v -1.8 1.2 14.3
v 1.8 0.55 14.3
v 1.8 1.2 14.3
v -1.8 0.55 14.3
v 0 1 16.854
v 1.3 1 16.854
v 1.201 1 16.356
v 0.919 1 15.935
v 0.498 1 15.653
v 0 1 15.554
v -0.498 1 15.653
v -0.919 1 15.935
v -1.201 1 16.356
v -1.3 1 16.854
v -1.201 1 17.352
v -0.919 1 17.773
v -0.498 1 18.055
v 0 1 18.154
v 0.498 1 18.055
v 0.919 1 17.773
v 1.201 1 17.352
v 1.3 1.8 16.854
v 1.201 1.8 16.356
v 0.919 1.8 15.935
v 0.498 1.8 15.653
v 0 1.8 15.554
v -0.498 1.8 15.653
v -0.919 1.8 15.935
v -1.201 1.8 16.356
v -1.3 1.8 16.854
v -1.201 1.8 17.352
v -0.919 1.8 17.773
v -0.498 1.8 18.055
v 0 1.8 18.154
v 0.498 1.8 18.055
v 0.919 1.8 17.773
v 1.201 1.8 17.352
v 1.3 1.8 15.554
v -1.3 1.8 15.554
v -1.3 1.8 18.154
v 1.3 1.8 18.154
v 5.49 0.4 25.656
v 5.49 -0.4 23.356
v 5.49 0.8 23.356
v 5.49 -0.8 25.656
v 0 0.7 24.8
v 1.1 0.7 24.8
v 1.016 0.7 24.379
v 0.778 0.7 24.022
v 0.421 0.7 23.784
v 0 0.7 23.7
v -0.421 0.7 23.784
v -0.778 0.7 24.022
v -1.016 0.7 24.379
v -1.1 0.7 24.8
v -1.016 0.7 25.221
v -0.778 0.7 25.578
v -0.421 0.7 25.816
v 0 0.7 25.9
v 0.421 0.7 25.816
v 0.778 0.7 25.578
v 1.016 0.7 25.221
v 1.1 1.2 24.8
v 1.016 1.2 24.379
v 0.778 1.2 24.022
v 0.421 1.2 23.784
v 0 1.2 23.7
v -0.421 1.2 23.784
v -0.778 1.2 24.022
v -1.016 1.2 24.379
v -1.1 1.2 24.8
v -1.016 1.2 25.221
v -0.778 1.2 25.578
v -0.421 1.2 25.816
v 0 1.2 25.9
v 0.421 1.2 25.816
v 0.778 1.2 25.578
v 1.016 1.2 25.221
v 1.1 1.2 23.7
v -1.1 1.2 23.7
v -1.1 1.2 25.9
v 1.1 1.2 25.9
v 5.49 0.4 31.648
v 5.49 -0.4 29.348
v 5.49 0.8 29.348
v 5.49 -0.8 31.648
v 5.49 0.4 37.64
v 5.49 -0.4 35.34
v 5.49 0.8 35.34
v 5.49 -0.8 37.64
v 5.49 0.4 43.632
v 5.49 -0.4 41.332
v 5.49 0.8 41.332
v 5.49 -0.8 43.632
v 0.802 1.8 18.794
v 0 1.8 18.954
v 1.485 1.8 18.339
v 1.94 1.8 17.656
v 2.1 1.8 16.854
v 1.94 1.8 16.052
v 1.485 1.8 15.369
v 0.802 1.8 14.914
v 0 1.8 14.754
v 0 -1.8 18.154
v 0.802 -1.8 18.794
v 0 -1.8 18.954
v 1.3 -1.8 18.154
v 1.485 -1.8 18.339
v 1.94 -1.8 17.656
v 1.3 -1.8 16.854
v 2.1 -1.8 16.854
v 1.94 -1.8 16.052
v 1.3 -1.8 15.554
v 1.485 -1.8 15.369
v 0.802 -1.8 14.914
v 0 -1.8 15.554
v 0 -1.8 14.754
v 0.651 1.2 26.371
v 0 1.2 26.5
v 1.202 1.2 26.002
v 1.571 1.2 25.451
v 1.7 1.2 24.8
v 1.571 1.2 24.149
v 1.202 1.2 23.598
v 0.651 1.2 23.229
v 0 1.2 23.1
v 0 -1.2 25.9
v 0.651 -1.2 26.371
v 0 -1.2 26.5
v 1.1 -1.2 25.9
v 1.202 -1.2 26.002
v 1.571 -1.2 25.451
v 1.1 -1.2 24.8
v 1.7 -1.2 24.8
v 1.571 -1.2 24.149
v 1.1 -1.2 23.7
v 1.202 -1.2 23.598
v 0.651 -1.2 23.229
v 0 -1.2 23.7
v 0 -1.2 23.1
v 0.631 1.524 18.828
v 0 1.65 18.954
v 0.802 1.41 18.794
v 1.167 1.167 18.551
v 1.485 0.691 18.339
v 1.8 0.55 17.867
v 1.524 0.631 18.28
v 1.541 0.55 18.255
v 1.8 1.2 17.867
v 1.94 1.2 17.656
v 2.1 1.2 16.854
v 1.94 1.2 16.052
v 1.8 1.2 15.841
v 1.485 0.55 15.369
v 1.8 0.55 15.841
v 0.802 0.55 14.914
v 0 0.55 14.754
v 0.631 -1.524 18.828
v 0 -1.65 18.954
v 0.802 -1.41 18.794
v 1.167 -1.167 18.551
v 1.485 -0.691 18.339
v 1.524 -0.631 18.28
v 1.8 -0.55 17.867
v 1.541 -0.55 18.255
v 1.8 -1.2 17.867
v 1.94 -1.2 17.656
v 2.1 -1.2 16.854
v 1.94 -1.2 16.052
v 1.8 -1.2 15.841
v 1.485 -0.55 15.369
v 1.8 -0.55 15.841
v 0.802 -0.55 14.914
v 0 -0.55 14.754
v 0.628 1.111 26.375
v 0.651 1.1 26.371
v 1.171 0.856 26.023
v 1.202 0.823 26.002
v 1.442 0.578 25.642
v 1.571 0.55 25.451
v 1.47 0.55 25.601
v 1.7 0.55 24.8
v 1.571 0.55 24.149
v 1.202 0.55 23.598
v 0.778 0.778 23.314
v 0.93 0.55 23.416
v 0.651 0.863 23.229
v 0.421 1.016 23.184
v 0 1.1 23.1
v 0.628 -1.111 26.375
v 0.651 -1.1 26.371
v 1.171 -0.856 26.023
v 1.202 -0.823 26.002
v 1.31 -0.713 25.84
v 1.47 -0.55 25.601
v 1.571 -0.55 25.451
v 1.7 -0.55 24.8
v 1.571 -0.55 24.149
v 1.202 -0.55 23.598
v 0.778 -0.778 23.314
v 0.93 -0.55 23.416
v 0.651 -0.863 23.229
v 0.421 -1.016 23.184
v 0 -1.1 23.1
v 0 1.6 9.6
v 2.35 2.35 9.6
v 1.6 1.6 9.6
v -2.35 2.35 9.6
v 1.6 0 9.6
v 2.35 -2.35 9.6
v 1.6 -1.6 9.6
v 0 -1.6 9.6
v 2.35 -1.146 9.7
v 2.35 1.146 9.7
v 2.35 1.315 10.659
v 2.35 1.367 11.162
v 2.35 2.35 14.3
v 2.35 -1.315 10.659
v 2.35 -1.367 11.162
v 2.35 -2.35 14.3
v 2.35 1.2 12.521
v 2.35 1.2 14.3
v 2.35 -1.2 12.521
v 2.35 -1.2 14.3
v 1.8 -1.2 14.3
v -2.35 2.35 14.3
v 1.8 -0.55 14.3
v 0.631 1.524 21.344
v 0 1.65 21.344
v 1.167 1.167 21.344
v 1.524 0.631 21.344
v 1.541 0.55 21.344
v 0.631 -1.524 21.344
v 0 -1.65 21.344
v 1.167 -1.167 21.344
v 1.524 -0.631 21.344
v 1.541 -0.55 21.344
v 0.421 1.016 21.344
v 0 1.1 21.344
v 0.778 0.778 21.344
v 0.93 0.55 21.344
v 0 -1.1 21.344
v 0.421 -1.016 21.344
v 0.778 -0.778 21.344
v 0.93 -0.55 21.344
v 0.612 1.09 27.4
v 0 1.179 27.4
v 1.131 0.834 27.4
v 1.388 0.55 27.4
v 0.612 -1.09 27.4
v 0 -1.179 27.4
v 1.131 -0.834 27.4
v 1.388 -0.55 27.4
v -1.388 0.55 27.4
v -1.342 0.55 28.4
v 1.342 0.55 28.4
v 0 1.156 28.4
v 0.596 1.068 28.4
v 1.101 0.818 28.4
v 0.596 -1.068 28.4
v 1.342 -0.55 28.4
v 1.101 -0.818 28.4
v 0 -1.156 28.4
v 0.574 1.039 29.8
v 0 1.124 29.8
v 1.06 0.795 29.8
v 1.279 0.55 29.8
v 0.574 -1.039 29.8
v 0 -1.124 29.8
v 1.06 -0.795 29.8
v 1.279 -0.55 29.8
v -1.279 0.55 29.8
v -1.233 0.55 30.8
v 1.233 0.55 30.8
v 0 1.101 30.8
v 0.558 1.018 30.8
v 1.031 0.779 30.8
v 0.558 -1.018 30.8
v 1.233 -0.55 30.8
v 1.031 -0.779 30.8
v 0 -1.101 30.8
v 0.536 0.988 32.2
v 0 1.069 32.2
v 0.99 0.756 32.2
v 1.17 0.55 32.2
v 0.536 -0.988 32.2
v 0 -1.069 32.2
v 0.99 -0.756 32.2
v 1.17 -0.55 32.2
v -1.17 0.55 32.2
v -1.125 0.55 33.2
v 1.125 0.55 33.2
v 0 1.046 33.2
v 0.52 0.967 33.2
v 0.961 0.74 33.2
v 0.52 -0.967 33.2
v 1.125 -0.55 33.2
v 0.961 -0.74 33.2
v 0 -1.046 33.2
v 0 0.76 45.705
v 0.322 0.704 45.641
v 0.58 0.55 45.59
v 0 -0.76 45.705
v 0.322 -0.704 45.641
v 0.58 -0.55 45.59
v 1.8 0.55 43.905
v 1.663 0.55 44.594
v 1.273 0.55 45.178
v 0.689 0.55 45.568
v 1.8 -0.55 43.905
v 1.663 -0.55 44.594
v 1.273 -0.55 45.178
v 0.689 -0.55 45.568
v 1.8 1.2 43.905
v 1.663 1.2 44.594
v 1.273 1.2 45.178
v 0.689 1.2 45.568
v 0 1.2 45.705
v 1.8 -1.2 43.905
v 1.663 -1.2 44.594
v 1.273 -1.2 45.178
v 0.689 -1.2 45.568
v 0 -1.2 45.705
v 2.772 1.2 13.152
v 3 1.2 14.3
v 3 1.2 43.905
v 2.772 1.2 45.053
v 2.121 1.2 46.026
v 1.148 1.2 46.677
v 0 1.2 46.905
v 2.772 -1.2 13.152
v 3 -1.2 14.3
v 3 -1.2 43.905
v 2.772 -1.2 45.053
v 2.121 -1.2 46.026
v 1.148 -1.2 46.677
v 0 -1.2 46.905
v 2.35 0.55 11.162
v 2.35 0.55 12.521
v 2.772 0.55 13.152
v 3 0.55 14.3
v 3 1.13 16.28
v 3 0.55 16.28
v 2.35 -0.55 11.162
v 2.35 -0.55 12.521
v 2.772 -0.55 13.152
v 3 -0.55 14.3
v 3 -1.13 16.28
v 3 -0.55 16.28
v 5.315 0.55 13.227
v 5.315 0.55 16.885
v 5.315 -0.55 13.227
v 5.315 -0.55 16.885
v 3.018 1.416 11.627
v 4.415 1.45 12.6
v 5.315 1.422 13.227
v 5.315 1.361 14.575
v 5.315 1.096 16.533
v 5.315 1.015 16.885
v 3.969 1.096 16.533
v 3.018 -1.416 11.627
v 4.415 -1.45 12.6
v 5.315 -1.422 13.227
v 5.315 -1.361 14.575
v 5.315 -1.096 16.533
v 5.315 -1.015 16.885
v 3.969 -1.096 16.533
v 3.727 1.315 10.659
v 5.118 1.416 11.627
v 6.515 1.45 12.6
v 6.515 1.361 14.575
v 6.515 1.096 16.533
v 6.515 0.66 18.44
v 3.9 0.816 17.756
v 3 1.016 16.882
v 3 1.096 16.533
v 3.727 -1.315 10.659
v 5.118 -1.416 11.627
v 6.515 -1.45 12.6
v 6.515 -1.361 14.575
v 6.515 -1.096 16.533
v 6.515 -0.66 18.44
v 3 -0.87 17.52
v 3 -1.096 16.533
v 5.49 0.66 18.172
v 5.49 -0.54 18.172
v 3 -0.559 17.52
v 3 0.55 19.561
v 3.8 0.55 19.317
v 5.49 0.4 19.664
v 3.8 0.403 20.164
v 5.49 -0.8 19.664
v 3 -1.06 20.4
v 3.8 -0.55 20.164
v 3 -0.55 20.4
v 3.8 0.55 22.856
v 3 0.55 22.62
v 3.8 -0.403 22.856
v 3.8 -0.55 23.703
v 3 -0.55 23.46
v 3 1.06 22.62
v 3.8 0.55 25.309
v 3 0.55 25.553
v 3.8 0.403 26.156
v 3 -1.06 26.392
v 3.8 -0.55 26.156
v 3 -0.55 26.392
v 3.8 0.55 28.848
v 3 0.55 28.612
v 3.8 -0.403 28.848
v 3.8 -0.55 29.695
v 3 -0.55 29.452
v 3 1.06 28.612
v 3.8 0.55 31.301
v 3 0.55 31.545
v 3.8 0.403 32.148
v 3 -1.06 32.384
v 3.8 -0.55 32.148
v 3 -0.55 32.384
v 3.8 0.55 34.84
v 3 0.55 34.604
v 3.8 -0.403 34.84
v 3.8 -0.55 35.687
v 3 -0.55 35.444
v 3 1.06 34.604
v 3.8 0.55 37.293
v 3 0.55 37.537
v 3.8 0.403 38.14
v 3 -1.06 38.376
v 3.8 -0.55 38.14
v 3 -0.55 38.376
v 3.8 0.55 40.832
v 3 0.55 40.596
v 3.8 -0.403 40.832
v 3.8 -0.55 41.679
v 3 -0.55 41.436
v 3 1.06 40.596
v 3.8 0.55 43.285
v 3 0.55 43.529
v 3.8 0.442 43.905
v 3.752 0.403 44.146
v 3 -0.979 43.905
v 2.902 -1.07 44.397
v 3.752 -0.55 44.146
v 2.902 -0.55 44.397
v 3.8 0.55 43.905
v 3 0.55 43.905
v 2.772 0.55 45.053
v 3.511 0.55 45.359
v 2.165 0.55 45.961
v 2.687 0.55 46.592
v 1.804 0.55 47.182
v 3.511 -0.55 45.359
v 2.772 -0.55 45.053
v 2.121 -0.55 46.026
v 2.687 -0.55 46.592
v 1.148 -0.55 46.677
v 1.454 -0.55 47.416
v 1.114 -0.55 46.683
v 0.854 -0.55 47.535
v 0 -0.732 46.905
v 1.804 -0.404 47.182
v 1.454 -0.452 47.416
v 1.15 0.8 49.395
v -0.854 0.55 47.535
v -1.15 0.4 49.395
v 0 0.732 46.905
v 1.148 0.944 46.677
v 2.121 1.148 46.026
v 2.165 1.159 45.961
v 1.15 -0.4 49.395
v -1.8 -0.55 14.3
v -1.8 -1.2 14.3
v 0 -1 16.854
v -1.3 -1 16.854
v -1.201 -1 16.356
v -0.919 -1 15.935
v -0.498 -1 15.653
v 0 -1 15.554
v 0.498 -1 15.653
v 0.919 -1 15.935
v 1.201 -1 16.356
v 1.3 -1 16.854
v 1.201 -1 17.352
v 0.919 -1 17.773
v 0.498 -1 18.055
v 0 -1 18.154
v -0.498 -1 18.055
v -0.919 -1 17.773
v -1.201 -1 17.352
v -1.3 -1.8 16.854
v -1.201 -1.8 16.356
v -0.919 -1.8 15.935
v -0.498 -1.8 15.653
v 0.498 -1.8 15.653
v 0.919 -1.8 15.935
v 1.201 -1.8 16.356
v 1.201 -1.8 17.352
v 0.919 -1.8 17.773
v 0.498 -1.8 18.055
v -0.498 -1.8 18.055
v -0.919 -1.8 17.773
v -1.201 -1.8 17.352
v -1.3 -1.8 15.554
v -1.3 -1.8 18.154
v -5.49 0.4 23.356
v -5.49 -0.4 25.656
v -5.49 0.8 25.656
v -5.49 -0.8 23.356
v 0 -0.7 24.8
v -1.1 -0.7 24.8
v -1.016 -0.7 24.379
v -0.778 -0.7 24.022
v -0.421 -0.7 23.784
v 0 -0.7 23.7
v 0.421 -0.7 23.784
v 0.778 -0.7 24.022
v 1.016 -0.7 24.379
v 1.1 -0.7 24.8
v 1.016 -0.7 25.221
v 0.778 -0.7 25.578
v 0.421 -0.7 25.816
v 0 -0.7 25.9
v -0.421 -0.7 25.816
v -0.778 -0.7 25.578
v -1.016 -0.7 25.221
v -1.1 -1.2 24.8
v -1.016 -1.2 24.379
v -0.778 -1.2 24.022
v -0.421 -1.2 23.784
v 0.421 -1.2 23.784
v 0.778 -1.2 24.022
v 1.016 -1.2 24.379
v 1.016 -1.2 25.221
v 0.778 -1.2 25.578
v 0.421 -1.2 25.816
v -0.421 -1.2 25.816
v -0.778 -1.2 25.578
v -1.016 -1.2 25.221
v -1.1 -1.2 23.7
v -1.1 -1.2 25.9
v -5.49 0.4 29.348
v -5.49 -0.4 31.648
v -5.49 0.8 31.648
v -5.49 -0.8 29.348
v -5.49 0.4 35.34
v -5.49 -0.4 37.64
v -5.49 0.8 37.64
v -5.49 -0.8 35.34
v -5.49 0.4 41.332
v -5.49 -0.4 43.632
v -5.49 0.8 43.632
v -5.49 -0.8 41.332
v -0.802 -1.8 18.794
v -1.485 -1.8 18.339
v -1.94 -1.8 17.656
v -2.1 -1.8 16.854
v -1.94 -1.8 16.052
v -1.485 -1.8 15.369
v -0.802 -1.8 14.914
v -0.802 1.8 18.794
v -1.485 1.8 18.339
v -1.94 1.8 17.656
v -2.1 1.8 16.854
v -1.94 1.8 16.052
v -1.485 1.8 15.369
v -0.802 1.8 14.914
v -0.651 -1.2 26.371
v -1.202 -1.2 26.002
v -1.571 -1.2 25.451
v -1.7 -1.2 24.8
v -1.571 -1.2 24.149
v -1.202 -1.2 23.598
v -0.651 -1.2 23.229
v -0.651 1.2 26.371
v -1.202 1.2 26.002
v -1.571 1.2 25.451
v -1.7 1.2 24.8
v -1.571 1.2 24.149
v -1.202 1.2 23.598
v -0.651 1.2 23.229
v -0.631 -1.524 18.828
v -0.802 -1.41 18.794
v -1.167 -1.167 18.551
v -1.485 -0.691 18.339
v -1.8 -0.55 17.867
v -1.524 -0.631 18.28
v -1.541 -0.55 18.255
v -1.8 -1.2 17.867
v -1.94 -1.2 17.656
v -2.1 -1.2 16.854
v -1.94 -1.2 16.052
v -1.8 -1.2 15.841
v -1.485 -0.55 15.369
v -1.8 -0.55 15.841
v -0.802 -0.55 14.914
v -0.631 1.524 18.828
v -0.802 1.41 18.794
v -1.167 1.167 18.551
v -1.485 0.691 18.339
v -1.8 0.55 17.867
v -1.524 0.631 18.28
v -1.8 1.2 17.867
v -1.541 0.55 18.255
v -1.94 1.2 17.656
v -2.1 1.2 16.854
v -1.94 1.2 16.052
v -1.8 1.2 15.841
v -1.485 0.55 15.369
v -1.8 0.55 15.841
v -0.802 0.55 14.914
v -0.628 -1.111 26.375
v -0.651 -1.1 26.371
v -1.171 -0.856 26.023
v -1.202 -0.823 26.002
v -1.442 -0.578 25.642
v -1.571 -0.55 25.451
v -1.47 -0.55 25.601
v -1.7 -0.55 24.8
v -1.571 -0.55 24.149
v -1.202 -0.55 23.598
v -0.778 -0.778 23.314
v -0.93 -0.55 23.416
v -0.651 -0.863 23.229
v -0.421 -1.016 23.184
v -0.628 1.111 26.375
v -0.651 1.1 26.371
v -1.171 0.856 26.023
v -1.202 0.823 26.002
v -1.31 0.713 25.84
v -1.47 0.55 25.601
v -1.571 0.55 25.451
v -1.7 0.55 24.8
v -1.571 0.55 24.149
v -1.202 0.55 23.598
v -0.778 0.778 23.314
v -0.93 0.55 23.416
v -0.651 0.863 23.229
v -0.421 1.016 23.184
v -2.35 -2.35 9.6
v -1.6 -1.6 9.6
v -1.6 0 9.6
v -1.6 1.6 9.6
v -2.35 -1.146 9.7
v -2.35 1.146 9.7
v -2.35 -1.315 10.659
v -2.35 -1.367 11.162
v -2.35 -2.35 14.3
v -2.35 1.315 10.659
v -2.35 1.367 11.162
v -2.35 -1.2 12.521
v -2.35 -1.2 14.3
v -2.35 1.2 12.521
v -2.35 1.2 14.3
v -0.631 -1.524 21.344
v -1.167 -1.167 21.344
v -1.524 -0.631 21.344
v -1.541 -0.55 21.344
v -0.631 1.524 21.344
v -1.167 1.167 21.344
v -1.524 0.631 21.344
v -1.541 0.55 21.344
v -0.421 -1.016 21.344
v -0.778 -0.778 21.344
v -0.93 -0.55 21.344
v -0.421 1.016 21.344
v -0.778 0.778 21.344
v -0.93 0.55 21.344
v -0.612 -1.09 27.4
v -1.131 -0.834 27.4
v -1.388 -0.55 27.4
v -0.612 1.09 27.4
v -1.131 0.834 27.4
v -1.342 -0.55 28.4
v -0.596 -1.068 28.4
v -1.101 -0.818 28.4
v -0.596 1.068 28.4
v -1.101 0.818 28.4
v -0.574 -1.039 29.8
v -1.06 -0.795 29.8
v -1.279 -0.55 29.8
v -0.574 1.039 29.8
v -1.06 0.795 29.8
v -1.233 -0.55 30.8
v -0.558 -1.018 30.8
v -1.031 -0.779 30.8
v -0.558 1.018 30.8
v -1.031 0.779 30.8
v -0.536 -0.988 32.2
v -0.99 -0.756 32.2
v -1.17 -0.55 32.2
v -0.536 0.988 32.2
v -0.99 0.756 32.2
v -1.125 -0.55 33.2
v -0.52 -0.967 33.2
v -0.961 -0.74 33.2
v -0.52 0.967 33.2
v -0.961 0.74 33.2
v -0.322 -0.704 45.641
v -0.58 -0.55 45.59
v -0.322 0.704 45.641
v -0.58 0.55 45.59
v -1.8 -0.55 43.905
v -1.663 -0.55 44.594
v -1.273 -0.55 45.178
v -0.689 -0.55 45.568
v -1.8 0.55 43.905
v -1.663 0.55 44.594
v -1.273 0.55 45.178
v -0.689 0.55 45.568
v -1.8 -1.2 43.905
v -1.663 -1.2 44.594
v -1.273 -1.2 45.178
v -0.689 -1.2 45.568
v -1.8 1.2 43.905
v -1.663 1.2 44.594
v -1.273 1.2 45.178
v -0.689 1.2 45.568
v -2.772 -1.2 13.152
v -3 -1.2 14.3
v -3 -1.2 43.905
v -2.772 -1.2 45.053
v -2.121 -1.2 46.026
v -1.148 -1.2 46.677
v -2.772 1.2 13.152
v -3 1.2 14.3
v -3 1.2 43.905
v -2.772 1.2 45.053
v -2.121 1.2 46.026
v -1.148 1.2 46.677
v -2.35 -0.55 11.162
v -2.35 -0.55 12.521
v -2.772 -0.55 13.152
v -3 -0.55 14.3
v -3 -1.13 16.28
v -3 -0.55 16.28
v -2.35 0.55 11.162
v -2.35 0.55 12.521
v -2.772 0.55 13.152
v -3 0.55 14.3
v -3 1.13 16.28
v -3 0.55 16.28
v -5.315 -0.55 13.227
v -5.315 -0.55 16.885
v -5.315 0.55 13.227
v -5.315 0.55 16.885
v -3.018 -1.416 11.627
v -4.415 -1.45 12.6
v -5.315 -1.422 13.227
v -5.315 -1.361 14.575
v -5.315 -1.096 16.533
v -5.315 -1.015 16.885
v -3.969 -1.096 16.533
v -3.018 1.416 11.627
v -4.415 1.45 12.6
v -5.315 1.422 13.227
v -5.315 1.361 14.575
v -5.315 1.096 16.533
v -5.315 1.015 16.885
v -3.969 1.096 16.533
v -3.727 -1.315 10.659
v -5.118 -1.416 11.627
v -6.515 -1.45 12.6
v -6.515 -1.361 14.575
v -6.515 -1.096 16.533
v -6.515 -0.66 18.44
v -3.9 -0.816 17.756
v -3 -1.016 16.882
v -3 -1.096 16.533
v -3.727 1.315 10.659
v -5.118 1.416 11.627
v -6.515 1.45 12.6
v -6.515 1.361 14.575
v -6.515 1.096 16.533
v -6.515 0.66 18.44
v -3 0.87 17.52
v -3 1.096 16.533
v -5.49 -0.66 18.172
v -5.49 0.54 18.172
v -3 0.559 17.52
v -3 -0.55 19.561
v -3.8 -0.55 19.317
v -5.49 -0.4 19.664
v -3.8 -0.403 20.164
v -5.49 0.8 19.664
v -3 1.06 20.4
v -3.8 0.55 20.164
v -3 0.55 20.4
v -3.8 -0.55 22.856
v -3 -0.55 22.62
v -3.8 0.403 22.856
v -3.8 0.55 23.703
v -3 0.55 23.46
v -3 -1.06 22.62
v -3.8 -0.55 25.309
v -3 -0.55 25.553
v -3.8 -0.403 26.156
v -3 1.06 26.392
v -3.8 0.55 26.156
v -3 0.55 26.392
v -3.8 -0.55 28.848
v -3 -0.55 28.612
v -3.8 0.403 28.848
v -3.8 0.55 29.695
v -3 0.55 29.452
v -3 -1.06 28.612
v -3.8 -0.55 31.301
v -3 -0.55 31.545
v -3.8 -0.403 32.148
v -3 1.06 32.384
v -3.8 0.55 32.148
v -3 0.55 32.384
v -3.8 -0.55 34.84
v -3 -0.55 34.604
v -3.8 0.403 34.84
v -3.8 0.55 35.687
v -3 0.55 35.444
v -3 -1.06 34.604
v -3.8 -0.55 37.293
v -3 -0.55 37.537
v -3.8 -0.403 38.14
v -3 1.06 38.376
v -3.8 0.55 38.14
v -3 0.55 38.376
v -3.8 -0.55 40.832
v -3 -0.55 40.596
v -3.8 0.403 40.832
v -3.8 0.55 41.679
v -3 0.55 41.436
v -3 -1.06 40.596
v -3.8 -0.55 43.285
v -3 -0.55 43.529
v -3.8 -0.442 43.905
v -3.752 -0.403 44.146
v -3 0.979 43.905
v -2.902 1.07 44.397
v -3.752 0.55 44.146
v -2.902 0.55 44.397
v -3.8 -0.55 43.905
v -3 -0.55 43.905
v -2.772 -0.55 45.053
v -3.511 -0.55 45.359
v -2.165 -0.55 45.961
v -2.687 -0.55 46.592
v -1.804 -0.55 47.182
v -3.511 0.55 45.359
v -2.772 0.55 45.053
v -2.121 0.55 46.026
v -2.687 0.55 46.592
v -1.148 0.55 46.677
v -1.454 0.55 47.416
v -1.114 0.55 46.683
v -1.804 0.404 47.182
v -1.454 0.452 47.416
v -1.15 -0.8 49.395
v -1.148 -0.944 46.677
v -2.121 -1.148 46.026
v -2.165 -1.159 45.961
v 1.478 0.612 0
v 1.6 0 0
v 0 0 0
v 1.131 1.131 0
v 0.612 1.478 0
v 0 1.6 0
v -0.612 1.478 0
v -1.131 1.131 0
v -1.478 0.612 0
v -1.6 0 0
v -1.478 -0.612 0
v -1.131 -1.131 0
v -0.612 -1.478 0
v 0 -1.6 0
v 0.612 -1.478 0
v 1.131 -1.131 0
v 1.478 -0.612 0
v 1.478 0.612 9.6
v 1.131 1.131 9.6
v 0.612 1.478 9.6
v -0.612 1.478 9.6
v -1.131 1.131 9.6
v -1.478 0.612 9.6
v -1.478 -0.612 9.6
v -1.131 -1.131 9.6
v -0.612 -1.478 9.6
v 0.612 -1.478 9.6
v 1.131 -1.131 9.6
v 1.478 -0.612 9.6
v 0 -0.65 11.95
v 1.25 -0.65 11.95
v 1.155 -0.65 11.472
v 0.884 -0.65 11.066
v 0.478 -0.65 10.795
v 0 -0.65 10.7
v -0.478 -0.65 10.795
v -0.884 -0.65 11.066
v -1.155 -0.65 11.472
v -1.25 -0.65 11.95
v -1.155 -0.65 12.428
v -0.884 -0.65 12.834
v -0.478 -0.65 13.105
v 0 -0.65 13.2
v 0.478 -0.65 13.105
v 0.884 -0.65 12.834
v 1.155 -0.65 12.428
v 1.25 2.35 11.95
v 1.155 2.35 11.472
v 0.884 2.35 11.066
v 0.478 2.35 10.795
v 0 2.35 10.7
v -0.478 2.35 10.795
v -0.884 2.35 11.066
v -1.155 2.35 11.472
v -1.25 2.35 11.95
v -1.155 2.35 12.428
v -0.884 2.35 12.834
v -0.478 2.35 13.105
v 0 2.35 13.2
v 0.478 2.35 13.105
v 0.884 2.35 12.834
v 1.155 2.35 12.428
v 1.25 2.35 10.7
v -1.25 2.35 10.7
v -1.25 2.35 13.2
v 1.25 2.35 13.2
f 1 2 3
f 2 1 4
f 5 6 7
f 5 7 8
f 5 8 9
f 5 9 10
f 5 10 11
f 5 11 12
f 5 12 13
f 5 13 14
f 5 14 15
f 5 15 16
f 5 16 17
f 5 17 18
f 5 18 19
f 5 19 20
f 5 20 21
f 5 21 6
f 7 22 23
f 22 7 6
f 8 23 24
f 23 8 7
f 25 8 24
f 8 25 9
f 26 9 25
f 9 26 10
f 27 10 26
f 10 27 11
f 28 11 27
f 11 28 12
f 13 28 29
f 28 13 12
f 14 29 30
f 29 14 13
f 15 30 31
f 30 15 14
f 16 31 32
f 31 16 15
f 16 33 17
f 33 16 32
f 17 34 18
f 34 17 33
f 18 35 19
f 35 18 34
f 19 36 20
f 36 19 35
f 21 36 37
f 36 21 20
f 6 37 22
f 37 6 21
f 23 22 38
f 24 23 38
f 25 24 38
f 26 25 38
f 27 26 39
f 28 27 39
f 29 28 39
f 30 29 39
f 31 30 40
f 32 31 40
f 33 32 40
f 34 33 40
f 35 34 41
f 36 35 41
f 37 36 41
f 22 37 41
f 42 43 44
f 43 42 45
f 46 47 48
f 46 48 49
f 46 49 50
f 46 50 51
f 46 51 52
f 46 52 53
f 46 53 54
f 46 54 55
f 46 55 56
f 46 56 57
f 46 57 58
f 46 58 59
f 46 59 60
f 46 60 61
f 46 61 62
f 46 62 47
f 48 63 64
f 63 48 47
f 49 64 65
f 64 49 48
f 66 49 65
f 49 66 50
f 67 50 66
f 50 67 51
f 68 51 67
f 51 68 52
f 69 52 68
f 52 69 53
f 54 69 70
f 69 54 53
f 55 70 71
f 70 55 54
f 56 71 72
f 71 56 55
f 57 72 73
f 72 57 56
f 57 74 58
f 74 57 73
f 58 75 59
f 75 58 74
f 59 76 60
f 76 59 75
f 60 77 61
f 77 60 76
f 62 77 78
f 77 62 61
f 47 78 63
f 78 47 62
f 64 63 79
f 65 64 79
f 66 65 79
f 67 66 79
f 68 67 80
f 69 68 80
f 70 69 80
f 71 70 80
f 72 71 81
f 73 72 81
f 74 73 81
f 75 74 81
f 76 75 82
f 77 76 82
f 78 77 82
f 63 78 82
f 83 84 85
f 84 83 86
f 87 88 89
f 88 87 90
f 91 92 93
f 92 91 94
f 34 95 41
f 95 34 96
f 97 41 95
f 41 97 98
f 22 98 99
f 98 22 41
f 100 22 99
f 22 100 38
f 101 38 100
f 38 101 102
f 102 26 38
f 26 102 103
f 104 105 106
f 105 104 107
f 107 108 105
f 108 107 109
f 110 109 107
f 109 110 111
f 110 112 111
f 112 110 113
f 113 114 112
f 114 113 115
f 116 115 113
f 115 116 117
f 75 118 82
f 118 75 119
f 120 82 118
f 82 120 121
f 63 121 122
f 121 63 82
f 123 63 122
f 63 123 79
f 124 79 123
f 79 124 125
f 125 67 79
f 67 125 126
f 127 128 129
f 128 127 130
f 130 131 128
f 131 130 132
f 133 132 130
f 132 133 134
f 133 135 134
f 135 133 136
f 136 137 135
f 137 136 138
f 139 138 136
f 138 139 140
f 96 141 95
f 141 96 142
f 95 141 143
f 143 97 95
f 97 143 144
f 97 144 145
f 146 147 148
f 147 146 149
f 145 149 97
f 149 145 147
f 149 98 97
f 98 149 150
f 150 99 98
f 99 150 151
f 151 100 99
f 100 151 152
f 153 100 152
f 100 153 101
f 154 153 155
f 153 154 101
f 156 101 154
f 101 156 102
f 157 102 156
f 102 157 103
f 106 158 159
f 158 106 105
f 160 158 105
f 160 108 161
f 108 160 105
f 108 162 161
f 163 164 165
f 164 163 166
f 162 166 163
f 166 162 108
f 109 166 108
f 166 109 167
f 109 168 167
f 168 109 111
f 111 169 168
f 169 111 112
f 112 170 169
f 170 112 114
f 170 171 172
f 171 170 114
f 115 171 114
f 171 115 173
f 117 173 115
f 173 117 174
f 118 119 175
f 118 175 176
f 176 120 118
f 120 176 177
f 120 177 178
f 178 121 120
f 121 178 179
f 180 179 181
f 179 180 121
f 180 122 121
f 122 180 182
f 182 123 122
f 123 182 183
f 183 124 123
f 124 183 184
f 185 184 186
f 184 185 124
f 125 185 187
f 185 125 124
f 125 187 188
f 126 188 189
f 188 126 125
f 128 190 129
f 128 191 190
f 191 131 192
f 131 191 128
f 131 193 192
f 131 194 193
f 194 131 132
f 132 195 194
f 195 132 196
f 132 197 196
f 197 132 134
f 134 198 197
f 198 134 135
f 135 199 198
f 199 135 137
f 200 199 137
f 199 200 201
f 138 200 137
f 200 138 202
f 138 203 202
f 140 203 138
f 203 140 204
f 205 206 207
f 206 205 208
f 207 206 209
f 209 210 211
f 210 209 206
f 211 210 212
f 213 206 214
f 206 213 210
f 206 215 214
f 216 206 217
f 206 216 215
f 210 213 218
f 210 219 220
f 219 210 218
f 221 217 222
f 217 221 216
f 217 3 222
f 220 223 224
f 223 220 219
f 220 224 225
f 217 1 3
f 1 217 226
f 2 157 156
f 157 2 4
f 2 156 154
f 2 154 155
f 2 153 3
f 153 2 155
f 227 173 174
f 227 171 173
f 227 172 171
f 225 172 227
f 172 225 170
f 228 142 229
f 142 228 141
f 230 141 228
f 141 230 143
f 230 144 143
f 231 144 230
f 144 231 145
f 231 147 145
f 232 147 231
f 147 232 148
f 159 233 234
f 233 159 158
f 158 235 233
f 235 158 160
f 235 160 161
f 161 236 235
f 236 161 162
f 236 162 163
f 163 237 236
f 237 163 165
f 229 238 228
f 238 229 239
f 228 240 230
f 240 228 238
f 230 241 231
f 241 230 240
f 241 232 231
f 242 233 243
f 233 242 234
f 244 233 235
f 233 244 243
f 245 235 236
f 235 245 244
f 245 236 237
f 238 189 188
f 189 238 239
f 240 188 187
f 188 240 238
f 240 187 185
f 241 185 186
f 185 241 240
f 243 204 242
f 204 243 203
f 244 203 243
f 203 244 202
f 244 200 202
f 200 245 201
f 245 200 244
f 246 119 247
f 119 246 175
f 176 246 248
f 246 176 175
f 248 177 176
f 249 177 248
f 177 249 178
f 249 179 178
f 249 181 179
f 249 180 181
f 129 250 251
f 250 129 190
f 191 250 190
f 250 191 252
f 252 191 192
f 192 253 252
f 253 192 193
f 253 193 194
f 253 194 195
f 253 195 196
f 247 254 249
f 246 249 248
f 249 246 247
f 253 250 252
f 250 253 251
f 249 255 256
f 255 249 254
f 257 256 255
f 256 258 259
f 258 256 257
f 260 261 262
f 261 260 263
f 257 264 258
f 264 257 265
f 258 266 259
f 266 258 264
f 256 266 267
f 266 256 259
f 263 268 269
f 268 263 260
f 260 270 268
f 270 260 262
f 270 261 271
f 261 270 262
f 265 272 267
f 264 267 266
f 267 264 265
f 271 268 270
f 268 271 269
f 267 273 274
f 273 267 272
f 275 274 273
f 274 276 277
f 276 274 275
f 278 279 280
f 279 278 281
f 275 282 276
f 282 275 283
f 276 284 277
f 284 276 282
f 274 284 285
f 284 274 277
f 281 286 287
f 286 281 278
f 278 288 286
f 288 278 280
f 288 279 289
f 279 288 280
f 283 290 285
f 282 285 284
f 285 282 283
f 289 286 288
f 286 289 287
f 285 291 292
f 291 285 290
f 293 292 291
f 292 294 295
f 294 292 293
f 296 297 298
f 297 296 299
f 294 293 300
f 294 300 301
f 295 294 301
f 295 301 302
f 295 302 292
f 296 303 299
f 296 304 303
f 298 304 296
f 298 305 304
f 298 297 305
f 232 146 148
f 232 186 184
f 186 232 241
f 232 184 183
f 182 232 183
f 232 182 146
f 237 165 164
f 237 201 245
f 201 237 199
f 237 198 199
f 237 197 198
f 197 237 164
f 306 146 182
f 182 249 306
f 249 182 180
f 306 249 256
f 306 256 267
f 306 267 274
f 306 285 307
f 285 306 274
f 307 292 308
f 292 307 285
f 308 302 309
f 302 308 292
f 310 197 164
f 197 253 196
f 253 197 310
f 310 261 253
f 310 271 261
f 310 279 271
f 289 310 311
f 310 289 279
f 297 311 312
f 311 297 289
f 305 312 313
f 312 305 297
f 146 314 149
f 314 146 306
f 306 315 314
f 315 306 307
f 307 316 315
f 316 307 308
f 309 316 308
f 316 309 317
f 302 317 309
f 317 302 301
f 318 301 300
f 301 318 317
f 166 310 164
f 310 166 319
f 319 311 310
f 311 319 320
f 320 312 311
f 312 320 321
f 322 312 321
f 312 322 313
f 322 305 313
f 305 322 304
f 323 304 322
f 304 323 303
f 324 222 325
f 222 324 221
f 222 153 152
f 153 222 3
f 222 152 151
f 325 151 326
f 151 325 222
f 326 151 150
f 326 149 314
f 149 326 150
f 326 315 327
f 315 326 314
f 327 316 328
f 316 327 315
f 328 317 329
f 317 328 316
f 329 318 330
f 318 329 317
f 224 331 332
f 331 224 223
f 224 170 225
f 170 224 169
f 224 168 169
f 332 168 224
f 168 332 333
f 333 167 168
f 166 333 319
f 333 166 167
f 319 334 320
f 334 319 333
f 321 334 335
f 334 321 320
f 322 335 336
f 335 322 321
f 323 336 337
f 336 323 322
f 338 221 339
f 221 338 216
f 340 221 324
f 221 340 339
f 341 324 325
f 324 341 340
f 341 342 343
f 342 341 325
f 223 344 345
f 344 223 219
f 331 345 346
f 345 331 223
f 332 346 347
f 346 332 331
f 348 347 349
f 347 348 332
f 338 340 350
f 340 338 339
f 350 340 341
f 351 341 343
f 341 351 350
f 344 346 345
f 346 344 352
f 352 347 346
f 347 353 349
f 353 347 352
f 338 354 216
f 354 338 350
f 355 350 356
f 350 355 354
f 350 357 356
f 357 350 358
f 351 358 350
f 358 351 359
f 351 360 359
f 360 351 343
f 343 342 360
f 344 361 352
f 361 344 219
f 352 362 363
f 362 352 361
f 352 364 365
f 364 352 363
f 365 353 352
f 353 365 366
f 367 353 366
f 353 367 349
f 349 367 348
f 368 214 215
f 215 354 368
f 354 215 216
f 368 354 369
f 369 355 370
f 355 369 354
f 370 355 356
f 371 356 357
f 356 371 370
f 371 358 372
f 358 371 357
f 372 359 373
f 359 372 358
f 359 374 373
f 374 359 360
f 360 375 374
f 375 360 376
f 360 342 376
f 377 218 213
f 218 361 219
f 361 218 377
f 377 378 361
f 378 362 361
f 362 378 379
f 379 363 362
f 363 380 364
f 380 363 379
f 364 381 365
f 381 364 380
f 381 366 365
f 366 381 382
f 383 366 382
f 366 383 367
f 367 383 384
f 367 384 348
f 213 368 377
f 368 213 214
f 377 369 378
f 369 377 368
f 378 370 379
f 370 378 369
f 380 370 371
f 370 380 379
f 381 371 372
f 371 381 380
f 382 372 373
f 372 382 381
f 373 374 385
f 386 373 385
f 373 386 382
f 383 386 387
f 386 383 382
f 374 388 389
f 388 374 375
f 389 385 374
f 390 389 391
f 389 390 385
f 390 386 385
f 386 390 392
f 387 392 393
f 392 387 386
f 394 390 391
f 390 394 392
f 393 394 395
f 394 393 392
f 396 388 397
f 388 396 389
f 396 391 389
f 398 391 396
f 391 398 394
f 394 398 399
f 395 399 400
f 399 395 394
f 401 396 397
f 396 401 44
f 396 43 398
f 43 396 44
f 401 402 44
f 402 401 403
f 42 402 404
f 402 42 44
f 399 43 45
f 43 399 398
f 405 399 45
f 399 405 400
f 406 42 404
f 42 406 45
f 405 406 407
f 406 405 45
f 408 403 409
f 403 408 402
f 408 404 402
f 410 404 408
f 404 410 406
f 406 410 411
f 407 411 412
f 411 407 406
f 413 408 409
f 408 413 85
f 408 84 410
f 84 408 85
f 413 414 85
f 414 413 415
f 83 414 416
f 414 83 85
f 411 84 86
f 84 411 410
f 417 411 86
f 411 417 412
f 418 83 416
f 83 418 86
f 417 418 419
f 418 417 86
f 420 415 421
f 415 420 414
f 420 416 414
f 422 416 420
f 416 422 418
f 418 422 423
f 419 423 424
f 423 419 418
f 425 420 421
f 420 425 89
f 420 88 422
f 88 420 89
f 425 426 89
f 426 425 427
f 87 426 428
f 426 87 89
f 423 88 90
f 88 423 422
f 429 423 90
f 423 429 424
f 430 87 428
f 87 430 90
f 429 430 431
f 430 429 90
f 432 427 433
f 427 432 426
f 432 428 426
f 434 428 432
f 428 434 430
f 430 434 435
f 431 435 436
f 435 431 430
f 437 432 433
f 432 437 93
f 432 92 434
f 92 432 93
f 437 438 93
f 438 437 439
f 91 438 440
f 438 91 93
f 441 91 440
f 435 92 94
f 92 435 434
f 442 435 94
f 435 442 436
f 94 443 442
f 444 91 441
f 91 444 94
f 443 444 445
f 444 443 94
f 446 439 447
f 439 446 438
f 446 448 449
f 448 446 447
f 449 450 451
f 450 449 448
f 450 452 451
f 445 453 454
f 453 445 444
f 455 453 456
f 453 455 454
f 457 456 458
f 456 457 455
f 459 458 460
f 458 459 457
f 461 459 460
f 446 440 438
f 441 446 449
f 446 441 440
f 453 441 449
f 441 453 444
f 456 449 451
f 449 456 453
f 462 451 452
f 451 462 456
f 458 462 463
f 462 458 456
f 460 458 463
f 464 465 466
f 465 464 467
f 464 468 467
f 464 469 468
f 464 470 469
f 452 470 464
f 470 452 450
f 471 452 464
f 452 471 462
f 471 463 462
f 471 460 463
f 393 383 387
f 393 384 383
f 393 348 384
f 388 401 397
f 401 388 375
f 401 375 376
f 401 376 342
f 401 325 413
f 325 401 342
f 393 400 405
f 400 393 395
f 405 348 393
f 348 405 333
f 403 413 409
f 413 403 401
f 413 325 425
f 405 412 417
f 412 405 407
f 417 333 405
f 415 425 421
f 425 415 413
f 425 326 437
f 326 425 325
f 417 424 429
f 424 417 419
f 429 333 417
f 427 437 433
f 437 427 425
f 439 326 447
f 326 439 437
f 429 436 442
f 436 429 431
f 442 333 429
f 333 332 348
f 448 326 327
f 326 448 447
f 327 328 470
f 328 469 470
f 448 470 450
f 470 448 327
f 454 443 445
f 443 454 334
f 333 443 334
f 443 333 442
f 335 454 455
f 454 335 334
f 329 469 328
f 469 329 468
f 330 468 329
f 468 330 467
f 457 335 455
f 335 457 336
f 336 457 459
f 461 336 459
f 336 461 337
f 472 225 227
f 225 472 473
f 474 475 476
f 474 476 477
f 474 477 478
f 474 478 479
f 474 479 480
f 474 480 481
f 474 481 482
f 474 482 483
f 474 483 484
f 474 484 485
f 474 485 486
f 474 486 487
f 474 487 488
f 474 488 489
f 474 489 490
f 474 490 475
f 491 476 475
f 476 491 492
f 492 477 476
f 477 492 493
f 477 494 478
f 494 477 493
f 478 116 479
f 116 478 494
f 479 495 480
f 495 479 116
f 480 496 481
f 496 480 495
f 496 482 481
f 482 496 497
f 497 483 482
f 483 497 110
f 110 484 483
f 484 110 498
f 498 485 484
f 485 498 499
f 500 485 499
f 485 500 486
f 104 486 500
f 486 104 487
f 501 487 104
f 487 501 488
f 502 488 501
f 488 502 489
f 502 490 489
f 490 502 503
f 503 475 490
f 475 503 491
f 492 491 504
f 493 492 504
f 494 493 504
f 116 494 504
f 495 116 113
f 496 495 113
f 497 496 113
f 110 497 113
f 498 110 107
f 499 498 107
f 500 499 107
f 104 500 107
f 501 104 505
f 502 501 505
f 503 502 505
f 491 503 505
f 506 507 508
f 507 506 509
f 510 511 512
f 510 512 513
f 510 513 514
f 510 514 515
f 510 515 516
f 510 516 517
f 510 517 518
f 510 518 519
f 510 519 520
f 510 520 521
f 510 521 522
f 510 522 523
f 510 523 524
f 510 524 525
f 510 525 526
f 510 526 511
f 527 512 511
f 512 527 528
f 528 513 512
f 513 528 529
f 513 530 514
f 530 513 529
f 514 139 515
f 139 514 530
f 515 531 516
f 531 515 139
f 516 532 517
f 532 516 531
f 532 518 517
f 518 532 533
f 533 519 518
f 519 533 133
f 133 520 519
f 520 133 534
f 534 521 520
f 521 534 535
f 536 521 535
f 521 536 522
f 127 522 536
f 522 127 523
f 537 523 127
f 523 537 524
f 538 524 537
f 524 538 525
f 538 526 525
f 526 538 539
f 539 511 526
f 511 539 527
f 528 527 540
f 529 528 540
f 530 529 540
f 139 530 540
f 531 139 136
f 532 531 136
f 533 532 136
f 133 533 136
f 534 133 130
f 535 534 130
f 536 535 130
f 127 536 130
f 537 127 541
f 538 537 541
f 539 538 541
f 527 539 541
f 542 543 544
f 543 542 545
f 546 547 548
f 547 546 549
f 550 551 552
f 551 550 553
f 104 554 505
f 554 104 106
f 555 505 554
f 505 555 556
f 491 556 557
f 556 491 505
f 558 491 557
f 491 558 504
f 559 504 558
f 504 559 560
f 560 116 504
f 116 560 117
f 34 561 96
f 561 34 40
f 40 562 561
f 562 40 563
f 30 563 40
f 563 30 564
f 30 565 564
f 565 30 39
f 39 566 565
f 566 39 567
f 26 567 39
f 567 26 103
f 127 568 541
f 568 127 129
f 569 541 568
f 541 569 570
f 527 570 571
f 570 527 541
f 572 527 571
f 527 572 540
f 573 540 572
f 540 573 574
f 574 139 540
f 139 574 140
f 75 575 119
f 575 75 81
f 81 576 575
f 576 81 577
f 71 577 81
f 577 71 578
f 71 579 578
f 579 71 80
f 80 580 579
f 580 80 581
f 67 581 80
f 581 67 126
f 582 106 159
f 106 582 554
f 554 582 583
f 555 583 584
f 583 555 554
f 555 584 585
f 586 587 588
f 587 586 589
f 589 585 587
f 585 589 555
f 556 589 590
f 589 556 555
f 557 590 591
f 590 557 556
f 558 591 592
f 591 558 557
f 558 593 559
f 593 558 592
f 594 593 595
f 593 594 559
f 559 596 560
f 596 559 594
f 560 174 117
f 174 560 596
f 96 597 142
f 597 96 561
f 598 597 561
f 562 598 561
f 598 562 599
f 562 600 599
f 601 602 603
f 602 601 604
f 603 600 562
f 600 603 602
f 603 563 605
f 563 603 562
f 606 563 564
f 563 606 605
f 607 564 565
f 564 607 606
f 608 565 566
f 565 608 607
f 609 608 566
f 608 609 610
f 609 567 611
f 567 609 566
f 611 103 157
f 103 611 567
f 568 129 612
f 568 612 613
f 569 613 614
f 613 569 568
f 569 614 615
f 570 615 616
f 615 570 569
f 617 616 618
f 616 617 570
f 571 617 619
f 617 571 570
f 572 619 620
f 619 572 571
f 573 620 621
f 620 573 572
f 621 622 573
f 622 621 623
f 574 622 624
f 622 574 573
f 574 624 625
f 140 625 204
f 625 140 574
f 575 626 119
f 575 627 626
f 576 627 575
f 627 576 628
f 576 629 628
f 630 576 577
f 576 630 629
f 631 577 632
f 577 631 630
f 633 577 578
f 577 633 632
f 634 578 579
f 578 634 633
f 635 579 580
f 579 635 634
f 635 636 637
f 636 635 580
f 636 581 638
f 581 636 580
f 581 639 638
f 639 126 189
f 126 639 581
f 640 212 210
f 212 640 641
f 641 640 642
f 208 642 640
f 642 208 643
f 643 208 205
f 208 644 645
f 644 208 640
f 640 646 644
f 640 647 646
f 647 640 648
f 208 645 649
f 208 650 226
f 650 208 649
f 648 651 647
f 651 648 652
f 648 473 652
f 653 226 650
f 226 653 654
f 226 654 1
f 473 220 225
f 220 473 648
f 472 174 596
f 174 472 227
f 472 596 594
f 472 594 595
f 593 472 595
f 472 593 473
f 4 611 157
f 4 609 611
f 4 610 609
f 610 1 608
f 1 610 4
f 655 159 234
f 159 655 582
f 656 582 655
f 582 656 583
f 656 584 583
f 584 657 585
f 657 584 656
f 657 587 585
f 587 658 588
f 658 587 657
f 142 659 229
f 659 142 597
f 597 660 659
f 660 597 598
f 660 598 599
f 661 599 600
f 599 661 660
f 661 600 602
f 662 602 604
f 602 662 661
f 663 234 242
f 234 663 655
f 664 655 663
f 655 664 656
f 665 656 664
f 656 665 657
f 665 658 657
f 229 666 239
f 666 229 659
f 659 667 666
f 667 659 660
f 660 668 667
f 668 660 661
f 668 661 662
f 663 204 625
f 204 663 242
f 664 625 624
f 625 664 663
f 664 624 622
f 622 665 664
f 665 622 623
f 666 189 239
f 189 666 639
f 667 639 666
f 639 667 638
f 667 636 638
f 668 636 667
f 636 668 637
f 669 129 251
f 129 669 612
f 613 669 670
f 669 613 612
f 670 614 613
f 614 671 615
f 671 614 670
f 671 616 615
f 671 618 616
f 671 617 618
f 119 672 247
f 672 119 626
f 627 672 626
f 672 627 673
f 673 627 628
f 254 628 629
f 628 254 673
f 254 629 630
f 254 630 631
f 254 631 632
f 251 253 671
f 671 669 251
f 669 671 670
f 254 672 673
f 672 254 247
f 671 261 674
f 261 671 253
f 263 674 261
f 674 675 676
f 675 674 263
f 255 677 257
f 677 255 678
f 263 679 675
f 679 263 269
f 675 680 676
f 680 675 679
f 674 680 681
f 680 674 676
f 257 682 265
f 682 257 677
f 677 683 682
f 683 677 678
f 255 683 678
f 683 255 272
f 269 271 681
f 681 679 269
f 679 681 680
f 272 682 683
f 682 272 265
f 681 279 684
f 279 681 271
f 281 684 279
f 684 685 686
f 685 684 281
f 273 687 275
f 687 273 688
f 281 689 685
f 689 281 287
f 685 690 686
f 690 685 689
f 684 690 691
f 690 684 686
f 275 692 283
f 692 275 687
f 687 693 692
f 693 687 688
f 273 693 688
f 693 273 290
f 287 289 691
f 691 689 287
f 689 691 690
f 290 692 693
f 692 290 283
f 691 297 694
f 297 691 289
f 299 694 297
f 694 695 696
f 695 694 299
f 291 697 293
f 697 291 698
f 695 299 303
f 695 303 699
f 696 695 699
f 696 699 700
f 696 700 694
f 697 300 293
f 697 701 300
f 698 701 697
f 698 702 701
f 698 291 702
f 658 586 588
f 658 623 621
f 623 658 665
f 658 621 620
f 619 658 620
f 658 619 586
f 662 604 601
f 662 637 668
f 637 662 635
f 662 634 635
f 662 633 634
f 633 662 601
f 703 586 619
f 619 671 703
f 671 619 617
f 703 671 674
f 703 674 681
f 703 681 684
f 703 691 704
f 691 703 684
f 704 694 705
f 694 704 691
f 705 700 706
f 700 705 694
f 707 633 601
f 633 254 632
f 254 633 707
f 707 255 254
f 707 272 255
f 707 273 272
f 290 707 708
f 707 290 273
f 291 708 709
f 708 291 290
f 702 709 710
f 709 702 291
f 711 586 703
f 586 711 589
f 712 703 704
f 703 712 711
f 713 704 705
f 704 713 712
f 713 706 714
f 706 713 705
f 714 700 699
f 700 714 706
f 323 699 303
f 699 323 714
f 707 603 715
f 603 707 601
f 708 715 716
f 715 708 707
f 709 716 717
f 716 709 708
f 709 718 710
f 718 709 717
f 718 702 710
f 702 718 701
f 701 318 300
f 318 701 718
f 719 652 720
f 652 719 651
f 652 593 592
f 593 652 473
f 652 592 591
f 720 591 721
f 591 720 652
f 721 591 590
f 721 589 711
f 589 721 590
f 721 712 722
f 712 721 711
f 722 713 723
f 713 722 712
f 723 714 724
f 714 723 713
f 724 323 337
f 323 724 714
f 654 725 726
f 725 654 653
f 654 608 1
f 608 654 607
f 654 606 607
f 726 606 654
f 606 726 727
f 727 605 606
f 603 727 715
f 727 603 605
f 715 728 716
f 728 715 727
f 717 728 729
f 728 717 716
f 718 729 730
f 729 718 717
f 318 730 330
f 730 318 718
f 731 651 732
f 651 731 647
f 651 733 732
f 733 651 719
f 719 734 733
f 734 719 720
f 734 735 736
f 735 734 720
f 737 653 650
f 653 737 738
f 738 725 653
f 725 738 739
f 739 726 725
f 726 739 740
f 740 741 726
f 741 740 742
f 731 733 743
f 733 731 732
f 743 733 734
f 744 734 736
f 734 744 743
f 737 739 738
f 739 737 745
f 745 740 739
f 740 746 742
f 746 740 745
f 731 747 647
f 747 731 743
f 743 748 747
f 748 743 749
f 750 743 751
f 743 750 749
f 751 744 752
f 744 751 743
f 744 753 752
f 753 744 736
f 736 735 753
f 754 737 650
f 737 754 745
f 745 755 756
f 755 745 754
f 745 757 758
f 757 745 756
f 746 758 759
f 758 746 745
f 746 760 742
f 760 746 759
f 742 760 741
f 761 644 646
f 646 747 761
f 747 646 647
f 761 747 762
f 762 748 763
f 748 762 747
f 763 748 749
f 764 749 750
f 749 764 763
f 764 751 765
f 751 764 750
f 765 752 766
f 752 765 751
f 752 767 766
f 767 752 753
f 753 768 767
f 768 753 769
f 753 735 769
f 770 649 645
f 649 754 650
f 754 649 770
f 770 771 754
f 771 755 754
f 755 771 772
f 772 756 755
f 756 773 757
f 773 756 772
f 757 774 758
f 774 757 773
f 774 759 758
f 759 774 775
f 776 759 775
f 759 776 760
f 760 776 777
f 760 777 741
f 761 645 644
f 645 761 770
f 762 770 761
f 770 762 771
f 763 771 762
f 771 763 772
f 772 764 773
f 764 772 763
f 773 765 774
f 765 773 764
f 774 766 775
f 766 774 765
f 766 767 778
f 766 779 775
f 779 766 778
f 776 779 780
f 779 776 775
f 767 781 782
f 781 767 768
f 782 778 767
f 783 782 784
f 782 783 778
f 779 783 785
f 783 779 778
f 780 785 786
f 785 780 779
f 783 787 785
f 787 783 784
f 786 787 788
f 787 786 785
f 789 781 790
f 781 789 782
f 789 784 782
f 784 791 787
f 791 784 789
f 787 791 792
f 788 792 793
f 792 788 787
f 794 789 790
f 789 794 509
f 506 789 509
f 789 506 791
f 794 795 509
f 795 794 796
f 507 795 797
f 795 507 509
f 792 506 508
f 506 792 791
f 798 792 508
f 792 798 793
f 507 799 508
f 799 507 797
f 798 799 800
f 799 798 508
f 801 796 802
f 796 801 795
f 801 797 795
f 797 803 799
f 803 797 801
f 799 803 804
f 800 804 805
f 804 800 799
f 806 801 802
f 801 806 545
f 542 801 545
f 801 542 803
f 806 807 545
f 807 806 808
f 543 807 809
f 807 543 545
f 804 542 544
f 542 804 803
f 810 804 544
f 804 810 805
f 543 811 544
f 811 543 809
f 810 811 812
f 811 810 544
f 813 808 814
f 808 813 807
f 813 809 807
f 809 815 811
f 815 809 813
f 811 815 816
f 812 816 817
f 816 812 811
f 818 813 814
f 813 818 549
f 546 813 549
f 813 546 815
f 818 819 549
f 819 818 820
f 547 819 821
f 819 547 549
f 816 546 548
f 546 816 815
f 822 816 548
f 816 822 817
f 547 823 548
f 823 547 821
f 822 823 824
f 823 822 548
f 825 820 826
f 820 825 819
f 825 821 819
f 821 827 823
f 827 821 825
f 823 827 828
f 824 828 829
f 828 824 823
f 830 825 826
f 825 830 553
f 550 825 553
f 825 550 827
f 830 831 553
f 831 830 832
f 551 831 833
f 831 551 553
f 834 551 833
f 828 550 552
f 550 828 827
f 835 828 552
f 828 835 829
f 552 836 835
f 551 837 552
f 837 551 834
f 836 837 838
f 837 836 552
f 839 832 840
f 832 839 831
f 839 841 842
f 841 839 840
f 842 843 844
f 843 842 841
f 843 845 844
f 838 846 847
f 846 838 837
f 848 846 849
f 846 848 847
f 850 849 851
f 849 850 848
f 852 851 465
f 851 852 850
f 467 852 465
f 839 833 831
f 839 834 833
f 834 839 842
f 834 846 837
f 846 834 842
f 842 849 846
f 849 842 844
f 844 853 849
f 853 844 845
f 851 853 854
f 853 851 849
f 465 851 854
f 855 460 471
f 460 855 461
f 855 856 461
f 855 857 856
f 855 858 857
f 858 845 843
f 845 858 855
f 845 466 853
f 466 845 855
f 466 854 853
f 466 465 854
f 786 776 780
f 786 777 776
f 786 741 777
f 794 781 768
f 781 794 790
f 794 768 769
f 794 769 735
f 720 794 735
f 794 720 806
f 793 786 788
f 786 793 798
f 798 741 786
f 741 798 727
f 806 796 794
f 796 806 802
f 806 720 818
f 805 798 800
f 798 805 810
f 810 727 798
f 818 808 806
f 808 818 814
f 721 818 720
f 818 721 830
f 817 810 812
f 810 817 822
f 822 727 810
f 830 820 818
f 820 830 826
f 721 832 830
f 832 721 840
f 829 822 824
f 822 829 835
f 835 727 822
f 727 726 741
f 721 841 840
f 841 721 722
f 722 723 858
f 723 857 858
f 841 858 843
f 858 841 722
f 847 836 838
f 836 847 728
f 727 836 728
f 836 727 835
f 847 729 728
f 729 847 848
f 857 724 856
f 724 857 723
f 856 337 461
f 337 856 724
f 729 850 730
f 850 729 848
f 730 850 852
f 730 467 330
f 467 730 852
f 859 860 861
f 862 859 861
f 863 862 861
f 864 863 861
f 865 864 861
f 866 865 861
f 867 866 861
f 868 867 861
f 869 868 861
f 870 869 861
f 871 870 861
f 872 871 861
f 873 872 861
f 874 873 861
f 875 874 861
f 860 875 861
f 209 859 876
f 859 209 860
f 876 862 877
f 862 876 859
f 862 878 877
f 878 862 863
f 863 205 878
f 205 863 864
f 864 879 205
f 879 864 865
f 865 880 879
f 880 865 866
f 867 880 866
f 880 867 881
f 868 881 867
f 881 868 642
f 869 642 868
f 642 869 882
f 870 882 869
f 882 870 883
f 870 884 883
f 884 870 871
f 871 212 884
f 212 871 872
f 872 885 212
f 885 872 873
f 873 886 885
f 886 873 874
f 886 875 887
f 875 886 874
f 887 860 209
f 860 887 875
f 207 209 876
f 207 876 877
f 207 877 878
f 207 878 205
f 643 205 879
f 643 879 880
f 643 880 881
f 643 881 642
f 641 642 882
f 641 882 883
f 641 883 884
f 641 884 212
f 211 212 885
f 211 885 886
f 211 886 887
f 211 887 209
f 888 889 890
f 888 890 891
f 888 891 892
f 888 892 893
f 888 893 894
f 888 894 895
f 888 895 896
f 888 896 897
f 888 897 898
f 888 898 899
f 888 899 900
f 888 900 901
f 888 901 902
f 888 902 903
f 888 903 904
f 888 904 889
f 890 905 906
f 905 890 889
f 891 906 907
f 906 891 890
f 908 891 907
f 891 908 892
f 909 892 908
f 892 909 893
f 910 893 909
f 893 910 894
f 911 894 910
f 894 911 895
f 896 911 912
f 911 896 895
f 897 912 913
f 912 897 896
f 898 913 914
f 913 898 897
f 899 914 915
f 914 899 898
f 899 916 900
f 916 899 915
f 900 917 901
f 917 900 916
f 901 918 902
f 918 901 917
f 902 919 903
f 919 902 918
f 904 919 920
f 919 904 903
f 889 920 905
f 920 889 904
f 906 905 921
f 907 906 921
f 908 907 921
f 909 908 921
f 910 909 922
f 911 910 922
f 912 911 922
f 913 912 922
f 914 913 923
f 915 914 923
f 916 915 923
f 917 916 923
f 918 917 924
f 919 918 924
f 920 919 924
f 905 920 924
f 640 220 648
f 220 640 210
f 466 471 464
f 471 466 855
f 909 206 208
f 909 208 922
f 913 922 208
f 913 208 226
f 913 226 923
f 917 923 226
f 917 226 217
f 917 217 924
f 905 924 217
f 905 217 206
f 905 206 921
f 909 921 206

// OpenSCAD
use <../lib.scad>
use <../p/4-4cylc.scad>
use <../p/4-4ndis.scad>
use <../p/rect.scad>
use <../p/recte4.scad>
use <s/55237is01.scad>
function ldraw_lib__55237i() = [
// 0 Bar  6.2L Sword with Lateral Blades
// 0 Name: 55237i.dat
// 0 Author: Massimo Maso [Sirio]
// 0 !LDRAW_ORG Part UPDATE 2024-08
// 0 !LICENSE Licensed under CC BY 4.0 : see CAreadme.txt
// 
// 0 BFC CERTIFY CCW
  [0,"BFC","CERTIFY"],
  [0,"BFC","CCW"],
// 
// 0 !CATEGORY Minifig Accessory
// 0 !KEYWORDS bionicle, Mini, Set 8624, Set 8892, Set 8893, Set 8894, Set 8925
// 0 !KEYWORDS set 8926, Set 8927, Toa Thok, Weapon
// 
// 0 !HISTORY 2013-08-14 {LEGO Digital Designer} Original part shape
// 0 !HISTORY 2022-02-14 [Sirio] File preparation for LDraw Parts Tracker
// 0 !HISTORY 2024-09-30 [OrionP] Official Update 2024-08
// 
// 
// 0 // Subparts
// 1 16 0 0 0 1 0 0 0 1 0 0 0 1 s\55237is01.dat
  [1,16,0,0,0,1,0,0,0,1,0,0,0,1, ldraw_lib__s__55237is01()],
// 1 16 0 0 0 -1 0 0 0 1 0 0 0 -1 s\55237is01.dat
  [1,16,0,0,0,-1,0,0,0,1,0,0,0,-1, ldraw_lib__s__55237is01()],
// 0 // Primitives
// 1 16 0 0 0 4 0 0 0 -24 0 0 0 4 4-4cylc.dat
  [1,16,0,0,0,4,0,0,0,-24,0,0,0,4, ldraw_lib__4_4cylc()],
// 1 16 0 -24 0 4 0 0 0 -1 0 0 0 4 4-4ndis.dat
  [1,16,0,-24,0,4,0,0,0,-1,0,0,0,4, ldraw_lib__4_4ndis()],
// 1 16 0 -29.875 5.875 5.875 0 0 0 0 5.875 0 1 0 recte4.dat
  [1,16,0,-29.875,5.875,5.875,0,0,0,0,5.875,0,1,0, ldraw_lib__recte4()],
// 0 BFC INVERTNEXT
  [0,"BFC","INVERTNEXT"],
// 1 16 0 -29.875 -1.625 3.125 0 0 0 0 3.125 0 7.5 0 4-4cylc.dat
  [1,16,0,-29.875,-1.625,3.125,0,0,0,0,3.125,0,7.5,0, ldraw_lib__4_4cylc()],
// 1 16 0 -29.875 5.875 3.125 0 0 0 0 3.125 0 -1 0 4-4ndis.dat
  [1,16,0,-29.875,5.875,3.125,0,0,0,0,3.125,0,-1,0, ldraw_lib__4_4ndis()],
// 1 16 0 -29.875 -5.875 5.875 0 0 0 0 5.875 0 1 0 rect.dat
  [1,16,0,-29.875,-5.875,5.875,0,0,0,0,5.875,0,1,0, ldraw_lib__rect()],
// 1 16 0 -123.4875 0 0 0 2.875 0 1 0 1.5 0 .5 rect.dat
  [1,16,0,-123.4875,0,0,0,2.875,0,1,0,1.5,0,.5, ldraw_lib__rect()],
// 0 // Faces
// 3 16 0 -26.75 5.875 5.875 -24 5.875 -5.875 -24 5.875
  [3,16,0,-26.75,5.875,5.875,-24,5.875,-5.875,-24,5.875],
// 3 16 0 -26.75 5.875 -5.875 -24 5.875 -3.125 -26.75 5.875
  [3,16,0,-26.75,5.875,-5.875,-24,5.875,-3.125,-26.75,5.875],
// 3 16 -3.125 -29.875 5.875 -3.125 -26.75 5.875 -5.875 -24 5.875
  [3,16,-3.125,-29.875,5.875,-3.125,-26.75,5.875,-5.875,-24,5.875],
// 3 16 -3.125 -29.875 5.875 -5.875 -24 5.875 -5.875 -35.75 5.875
  [3,16,-3.125,-29.875,5.875,-5.875,-24,5.875,-5.875,-35.75,5.875],
// 3 16 -3.125 -29.875 5.875 -5.875 -35.75 5.875 -3.125 -33 5.875
  [3,16,-3.125,-29.875,5.875,-5.875,-35.75,5.875,-3.125,-33,5.875],
// 3 16 0 -33 5.875 -3.125 -33 5.875 -5.875 -35.75 5.875
  [3,16,0,-33,5.875,-3.125,-33,5.875,-5.875,-35.75,5.875],
// 3 16 0 -33 5.875 -5.875 -35.75 5.875 5.875 -35.75 5.875
  [3,16,0,-33,5.875,-5.875,-35.75,5.875,5.875,-35.75,5.875],
// 3 16 0 -33 5.875 5.875 -35.75 5.875 3.125 -33 5.875
  [3,16,0,-33,5.875,5.875,-35.75,5.875,3.125,-33,5.875],
// 3 16 3.125 -29.875 5.875 3.125 -33 5.875 5.875 -35.75 5.875
  [3,16,3.125,-29.875,5.875,3.125,-33,5.875,5.875,-35.75,5.875],
// 3 16 3.125 -29.875 5.875 5.875 -35.75 5.875 5.875 -24 5.875
  [3,16,3.125,-29.875,5.875,5.875,-35.75,5.875,5.875,-24,5.875],
// 3 16 3.125 -29.875 5.875 5.875 -24 5.875 3.125 -26.75 5.875
  [3,16,3.125,-29.875,5.875,5.875,-24,5.875,3.125,-26.75,5.875],
// 3 16 0 -26.75 5.875 3.125 -26.75 5.875 5.875 -24 5.875
  [3,16,0,-26.75,5.875,3.125,-26.75,5.875,5.875,-24,5.875],
];
module ldraw_lib__55237i(step=0, col=false, unit=2/5, alt=false, line=0.2, solid=!$preview)
    makepoly(ldraw_lib__55237i(), step=step, col=col, unit=unit, alt=alt, line=line, solid=solid);
ldraw_lib__55237i(line=0.2);
